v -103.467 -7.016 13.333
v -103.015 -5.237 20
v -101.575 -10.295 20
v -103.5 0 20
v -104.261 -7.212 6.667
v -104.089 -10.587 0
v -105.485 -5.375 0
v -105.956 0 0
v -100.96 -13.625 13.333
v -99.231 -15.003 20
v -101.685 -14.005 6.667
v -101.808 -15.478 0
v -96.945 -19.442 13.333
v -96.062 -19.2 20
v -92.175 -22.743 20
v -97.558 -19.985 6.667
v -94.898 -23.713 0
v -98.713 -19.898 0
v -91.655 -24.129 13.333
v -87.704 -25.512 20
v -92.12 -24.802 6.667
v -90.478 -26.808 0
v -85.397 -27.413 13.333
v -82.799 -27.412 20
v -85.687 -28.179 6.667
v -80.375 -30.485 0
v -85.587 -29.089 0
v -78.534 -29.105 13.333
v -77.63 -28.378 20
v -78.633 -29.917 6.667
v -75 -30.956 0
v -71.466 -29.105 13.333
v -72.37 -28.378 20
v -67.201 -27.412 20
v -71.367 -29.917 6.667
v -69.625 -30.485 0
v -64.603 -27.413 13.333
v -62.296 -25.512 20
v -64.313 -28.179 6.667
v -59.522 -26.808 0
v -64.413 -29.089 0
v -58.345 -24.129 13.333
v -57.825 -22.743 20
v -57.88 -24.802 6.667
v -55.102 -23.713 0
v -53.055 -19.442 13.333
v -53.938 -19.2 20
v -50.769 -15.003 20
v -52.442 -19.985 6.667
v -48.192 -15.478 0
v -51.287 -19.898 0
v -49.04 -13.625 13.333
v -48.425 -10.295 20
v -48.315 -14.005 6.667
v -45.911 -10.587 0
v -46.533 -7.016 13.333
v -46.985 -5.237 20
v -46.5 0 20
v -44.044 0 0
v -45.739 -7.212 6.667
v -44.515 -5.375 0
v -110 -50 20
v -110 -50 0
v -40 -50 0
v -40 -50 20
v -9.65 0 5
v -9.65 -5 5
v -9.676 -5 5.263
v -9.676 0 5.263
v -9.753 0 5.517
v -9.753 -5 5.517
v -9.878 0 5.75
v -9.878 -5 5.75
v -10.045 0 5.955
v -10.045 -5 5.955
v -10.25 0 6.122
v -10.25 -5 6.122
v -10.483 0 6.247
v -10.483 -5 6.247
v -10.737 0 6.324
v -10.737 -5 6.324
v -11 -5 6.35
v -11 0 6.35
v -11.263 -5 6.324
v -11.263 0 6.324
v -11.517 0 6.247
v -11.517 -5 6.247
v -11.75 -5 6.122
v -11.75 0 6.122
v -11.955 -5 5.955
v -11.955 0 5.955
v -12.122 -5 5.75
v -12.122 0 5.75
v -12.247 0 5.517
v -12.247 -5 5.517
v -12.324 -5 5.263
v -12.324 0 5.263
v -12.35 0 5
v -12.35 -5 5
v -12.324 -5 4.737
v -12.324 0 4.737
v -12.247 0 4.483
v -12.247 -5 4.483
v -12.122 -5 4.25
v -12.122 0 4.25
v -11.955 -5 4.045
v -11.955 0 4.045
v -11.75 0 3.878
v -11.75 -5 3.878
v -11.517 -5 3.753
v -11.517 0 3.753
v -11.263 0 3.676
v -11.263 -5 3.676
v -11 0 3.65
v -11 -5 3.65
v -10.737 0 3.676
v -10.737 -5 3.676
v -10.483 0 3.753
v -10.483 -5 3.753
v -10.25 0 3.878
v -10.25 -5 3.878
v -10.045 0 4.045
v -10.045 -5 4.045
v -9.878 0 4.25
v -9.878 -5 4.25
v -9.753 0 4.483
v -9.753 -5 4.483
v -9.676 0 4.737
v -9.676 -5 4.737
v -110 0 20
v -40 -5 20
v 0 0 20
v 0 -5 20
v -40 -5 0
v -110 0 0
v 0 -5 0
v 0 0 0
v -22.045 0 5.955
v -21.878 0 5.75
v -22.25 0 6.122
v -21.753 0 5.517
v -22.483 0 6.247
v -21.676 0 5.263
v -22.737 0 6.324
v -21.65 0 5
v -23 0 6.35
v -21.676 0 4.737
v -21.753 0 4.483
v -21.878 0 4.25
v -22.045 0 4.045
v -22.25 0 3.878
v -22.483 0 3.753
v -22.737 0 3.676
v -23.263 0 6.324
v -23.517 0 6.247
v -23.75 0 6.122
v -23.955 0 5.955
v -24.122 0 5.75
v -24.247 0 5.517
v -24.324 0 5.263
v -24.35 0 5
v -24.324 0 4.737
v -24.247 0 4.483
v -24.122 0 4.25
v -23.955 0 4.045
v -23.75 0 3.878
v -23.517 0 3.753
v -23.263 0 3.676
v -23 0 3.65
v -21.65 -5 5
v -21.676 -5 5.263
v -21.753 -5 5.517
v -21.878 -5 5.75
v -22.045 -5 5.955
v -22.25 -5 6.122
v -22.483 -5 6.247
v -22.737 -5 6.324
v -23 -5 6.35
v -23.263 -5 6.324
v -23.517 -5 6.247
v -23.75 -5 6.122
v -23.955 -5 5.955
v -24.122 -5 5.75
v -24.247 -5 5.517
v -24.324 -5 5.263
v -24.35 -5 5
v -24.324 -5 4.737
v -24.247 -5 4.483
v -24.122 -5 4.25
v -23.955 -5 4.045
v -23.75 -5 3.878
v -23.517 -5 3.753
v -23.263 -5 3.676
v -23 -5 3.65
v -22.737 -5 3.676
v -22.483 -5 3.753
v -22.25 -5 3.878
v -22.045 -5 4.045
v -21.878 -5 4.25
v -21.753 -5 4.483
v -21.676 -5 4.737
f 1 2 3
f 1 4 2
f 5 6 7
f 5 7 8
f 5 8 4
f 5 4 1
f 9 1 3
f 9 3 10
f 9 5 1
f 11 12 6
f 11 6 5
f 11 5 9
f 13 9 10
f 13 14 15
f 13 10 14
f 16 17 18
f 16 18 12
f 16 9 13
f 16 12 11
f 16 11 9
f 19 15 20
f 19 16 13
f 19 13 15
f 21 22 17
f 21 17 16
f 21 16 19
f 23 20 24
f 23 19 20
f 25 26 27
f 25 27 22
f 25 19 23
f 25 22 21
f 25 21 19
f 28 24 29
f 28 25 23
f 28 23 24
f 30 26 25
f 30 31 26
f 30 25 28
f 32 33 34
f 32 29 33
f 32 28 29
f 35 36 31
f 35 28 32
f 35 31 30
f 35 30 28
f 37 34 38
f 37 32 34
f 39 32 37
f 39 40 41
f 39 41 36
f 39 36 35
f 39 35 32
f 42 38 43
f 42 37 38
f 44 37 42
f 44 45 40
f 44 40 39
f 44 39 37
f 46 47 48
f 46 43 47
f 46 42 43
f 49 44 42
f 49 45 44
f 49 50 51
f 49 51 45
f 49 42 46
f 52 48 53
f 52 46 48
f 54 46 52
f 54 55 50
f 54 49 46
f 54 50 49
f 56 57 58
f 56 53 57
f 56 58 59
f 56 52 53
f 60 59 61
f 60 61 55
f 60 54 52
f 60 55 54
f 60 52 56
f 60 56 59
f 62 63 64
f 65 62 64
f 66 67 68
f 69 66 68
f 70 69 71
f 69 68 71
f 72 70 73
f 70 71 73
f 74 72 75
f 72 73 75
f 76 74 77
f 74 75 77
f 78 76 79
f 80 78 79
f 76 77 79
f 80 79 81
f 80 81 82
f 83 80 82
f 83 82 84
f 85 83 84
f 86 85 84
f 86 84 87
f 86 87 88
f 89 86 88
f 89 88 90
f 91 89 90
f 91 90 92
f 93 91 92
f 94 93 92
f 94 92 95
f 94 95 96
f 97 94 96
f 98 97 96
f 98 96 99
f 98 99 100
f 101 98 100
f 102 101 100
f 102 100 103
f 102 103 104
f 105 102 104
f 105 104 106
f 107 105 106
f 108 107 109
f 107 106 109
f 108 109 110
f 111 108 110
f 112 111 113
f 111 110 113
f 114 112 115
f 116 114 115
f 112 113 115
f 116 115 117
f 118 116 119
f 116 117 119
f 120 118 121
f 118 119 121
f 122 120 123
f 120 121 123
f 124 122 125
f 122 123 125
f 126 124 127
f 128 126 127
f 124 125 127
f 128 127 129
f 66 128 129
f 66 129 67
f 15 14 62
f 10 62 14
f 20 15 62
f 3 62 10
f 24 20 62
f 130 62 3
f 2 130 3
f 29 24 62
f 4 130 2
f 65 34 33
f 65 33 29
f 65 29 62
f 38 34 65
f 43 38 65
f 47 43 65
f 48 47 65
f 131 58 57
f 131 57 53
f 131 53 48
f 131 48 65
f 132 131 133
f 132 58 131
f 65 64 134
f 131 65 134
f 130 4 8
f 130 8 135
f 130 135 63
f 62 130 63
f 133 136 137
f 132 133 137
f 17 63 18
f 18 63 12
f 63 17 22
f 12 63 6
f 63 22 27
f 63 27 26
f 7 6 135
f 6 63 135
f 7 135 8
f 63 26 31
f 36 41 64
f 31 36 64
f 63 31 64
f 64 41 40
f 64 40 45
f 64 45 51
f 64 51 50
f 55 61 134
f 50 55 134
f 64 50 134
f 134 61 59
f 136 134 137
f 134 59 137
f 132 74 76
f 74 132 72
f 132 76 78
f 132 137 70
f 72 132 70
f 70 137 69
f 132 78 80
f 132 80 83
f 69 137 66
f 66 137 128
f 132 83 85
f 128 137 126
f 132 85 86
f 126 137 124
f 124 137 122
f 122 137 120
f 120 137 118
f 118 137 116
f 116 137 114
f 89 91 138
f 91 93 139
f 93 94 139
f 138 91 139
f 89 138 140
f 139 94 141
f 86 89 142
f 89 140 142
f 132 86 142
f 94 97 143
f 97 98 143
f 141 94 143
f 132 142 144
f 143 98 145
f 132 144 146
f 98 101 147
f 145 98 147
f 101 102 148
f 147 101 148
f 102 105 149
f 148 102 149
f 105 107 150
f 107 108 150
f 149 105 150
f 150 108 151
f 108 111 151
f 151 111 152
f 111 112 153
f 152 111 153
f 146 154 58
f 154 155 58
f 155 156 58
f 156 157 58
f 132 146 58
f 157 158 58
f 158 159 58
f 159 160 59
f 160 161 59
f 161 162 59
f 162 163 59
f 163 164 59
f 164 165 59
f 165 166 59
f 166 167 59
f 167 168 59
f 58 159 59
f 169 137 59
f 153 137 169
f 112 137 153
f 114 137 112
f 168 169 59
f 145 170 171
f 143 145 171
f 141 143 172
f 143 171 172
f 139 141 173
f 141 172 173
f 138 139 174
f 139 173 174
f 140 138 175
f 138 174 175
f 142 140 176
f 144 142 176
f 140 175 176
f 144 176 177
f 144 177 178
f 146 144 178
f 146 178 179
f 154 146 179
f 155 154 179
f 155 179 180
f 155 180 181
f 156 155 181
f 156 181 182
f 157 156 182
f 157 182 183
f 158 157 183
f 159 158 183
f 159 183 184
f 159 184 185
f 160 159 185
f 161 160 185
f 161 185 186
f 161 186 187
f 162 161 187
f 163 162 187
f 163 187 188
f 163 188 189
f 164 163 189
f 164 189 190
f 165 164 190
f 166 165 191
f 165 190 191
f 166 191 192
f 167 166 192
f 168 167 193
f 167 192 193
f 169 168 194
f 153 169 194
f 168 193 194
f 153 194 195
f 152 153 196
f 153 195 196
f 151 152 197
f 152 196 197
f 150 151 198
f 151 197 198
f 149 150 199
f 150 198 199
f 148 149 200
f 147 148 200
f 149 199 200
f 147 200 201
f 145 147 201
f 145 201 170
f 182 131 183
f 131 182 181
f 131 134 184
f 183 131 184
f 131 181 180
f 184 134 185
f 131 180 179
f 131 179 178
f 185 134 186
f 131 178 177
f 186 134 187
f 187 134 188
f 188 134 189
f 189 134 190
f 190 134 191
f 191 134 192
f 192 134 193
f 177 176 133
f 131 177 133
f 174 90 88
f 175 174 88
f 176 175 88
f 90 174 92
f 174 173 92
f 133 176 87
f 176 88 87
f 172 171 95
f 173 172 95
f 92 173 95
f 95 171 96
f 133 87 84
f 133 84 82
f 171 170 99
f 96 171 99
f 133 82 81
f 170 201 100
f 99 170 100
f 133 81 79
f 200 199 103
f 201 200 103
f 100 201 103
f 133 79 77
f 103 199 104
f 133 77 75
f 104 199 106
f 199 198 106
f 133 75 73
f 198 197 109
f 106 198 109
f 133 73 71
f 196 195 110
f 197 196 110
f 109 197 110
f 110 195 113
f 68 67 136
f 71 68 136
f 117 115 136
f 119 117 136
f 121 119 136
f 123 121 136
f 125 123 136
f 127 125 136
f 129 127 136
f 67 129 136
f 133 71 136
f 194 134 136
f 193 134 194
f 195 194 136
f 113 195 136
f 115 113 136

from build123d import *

# Parameters (mm, degrees)
SKETCH1_W           = 40
SKETCH1_H           = 5
BOSS_EXTRUDE1_DEPTH = 20
SKETCH2_R           = 28.5
CUT_EXTRUDE1_DEPTH  = 21
CUT_EXTRUDE1_TAPER  = -7
SKETCH3_R           = 1.35
CUT_EXTRUDE2_DEPTH  = 6.0000001


with BuildPart() as part:
    # Sketch1 → Boss-Extrude1 (new body)
    with BuildSketch(Plane.XY):
        with Locations((-20, -2.5)):
            Rectangle(SKETCH1_W, SKETCH1_H)
        Polygon((-40, -5), (-40, 0), (-110, 0), (-110, -50), (-40, -50), align=None)
    extrude(amount=BOSS_EXTRUDE1_DEPTH)

    # Sketch2 → Cut-Extrude1 (cut, through all)
    with BuildSketch(Plane.XY.offset(20)):
        with Locations((-75, 0)):
            Circle(SKETCH2_R)
    extrude(amount=-CUT_EXTRUDE1_DEPTH, taper=CUT_EXTRUDE1_TAPER, mode=Mode.SUBTRACT)

    # Sketch3 → Cut-Extrude2 (cut, through all)
    with BuildSketch(Plane.XZ.offset(5)):
        with Locations((-23, 5)):
            Circle(SKETCH3_R)
        with Locations((-11, 5)):
            Circle(SKETCH3_R)
    extrude(amount=-CUT_EXTRUDE2_DEPTH, mode=Mode.SUBTRACT)


solid = part.part
